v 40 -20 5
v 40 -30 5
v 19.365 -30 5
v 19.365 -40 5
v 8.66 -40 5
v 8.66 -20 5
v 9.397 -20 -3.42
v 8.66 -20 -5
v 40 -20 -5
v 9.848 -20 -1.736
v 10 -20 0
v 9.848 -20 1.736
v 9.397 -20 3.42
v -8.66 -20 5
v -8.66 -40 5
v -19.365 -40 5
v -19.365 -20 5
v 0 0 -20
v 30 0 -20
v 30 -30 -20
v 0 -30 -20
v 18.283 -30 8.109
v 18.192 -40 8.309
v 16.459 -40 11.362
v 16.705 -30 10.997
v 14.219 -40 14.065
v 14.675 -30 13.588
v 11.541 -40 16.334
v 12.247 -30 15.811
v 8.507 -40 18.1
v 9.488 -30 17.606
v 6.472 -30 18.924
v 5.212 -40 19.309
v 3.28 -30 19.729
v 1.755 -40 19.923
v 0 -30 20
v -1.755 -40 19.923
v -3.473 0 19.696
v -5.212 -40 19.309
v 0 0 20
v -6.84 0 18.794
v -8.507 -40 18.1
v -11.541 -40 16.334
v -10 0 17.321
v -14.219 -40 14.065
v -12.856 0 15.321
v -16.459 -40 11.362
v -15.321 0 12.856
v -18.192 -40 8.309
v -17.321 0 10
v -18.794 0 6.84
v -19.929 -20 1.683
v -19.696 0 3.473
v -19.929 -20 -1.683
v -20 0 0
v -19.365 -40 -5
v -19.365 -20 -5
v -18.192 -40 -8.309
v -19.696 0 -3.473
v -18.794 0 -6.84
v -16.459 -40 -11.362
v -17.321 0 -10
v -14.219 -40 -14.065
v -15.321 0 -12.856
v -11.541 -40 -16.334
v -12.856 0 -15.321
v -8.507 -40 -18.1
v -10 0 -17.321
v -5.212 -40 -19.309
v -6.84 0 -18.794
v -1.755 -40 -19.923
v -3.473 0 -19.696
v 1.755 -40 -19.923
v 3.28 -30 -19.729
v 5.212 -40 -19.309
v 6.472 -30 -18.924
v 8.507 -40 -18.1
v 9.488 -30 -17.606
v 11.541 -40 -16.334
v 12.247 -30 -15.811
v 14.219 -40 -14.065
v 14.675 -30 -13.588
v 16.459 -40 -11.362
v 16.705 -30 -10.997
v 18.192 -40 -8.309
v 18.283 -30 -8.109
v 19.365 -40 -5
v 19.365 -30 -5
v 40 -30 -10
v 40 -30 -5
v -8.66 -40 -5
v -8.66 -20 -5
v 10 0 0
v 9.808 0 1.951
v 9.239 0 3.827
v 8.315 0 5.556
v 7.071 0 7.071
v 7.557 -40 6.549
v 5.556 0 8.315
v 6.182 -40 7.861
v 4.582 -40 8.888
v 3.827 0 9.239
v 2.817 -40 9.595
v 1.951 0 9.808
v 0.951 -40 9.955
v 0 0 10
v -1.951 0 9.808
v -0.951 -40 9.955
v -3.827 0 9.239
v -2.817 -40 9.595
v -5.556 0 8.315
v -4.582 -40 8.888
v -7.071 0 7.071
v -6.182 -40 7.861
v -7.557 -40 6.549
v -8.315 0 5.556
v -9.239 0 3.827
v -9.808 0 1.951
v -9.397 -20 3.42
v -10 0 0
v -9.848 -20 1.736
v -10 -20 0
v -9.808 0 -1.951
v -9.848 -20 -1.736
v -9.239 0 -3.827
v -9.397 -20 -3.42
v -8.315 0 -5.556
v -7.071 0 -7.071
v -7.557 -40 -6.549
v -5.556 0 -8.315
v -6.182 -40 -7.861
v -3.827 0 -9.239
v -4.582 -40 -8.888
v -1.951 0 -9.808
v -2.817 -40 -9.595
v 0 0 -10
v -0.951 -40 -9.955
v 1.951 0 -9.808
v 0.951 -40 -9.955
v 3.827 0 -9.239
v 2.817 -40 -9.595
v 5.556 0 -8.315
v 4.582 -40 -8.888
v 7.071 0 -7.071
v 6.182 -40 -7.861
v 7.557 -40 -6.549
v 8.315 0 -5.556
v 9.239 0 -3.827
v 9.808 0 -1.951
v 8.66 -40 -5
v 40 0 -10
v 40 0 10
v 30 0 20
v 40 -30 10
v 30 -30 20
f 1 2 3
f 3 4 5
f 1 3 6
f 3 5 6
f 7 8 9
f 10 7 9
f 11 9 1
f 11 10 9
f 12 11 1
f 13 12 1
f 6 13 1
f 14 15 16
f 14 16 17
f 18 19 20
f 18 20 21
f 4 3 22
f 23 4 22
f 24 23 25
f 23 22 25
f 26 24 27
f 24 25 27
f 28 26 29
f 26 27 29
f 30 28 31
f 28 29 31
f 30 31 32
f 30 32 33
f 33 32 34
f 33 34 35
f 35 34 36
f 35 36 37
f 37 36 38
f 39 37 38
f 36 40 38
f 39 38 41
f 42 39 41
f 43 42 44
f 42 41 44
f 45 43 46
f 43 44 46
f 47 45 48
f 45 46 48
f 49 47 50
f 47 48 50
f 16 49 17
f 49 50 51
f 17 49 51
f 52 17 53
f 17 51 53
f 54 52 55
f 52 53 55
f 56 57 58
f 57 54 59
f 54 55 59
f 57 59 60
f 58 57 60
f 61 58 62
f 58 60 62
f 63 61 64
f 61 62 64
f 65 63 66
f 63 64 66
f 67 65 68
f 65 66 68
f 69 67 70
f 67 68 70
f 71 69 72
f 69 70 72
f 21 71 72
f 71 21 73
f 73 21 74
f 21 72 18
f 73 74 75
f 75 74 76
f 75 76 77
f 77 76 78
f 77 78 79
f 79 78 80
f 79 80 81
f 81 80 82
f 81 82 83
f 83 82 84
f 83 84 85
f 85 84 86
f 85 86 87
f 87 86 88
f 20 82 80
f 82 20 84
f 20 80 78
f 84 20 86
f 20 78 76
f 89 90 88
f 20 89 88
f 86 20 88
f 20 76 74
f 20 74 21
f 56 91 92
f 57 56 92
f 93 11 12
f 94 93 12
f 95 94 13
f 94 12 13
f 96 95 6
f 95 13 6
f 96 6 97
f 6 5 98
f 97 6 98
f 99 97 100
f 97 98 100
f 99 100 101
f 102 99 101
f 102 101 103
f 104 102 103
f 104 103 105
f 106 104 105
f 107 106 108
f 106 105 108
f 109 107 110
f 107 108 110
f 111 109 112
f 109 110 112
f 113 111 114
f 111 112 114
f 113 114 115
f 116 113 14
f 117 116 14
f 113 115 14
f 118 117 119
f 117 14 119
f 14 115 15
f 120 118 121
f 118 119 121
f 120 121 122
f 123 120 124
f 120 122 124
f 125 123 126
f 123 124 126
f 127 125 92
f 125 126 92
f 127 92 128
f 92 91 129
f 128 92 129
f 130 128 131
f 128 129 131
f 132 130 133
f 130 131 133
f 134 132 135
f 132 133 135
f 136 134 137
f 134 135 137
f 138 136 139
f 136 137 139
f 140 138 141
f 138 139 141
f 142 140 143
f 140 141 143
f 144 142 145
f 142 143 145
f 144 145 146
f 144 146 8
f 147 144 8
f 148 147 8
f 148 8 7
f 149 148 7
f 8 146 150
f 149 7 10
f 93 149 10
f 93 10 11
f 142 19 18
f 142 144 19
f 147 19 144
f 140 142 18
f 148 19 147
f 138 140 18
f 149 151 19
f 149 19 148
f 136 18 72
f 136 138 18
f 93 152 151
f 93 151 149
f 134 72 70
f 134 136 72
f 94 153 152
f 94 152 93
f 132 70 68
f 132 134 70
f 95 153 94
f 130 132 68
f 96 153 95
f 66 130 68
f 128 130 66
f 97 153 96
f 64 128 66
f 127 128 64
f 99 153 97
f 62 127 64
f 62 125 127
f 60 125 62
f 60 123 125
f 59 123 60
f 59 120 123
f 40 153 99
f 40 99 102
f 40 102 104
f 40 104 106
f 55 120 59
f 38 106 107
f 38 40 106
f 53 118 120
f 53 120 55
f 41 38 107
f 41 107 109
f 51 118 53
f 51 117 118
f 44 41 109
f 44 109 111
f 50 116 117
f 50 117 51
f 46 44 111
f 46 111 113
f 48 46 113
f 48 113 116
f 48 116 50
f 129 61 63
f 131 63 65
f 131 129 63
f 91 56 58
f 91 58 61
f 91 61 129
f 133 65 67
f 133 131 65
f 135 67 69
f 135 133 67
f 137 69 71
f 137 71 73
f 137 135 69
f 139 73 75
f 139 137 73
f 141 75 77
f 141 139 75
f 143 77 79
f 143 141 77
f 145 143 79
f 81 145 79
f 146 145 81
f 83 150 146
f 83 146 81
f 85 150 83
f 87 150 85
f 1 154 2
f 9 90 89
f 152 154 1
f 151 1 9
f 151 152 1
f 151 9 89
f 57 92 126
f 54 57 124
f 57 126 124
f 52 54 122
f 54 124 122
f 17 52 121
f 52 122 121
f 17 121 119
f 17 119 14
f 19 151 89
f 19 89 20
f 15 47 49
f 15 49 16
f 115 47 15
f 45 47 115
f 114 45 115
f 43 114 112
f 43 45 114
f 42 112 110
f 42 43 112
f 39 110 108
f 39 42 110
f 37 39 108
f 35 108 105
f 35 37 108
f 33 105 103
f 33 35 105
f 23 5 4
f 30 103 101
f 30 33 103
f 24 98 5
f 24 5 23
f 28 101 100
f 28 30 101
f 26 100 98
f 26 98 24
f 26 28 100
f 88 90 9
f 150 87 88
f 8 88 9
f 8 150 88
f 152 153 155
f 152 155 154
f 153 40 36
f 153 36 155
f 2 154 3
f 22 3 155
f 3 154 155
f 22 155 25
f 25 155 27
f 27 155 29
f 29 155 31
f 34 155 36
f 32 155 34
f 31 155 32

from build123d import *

# Parameters (mm, degrees)
F0_R          = 20
F1_DEPTH      = 40
F3_DEPTH      = 30
F4_R          = 10
F5_DEPTH      = 40.001
F6_W          = 20
F6_H          = 10
F7_DEPTH      = 20.001
F7_DEPTH_BACK = 40.001


with BuildPart() as f1:
    # F0 (on Front) → F1 (new body)
    with BuildSketch(Plane.XZ):
        Circle(F0_R)
    extrude(amount=F1_DEPTH)

    # F2 (on face) → F3 (join)
    with BuildSketch(Plane(origin=(0, 0, 0), x_dir=(-1, 0, 0), z_dir=(0, 1, 0))):
        with BuildLine():
            ThreePointArc((0, -20), (-20, 0), (0, 20))
            Line((0, 20), (-30, 20))
            Line((-30, 20), (-40, 10))
            Line((-40, 10), (-40, -10))
            Line((-40, -10), (-30, -20))
            Line((-30, -20), (0, -20))
        make_face()
    extrude(amount=-F3_DEPTH)

    # F4 (on face) → F5 (cut, through all)
    with BuildSketch(Plane.XZ.offset(40)):
        Circle(F4_R)
    extrude(amount=-F5_DEPTH, mode=Mode.SUBTRACT)

    # F6 (on Right) → F7 (cut, two sides)
    with BuildSketch(Plane.YZ) as f7_sk:
        with Locations((-30, 0)):
            Rectangle(F6_W, F6_H)
    extrude(amount=-F7_DEPTH, mode=Mode.SUBTRACT)
    extrude(f7_sk.sketch, amount=F7_DEPTH_BACK, mode=Mode.SUBTRACT)


solid = f1.part
